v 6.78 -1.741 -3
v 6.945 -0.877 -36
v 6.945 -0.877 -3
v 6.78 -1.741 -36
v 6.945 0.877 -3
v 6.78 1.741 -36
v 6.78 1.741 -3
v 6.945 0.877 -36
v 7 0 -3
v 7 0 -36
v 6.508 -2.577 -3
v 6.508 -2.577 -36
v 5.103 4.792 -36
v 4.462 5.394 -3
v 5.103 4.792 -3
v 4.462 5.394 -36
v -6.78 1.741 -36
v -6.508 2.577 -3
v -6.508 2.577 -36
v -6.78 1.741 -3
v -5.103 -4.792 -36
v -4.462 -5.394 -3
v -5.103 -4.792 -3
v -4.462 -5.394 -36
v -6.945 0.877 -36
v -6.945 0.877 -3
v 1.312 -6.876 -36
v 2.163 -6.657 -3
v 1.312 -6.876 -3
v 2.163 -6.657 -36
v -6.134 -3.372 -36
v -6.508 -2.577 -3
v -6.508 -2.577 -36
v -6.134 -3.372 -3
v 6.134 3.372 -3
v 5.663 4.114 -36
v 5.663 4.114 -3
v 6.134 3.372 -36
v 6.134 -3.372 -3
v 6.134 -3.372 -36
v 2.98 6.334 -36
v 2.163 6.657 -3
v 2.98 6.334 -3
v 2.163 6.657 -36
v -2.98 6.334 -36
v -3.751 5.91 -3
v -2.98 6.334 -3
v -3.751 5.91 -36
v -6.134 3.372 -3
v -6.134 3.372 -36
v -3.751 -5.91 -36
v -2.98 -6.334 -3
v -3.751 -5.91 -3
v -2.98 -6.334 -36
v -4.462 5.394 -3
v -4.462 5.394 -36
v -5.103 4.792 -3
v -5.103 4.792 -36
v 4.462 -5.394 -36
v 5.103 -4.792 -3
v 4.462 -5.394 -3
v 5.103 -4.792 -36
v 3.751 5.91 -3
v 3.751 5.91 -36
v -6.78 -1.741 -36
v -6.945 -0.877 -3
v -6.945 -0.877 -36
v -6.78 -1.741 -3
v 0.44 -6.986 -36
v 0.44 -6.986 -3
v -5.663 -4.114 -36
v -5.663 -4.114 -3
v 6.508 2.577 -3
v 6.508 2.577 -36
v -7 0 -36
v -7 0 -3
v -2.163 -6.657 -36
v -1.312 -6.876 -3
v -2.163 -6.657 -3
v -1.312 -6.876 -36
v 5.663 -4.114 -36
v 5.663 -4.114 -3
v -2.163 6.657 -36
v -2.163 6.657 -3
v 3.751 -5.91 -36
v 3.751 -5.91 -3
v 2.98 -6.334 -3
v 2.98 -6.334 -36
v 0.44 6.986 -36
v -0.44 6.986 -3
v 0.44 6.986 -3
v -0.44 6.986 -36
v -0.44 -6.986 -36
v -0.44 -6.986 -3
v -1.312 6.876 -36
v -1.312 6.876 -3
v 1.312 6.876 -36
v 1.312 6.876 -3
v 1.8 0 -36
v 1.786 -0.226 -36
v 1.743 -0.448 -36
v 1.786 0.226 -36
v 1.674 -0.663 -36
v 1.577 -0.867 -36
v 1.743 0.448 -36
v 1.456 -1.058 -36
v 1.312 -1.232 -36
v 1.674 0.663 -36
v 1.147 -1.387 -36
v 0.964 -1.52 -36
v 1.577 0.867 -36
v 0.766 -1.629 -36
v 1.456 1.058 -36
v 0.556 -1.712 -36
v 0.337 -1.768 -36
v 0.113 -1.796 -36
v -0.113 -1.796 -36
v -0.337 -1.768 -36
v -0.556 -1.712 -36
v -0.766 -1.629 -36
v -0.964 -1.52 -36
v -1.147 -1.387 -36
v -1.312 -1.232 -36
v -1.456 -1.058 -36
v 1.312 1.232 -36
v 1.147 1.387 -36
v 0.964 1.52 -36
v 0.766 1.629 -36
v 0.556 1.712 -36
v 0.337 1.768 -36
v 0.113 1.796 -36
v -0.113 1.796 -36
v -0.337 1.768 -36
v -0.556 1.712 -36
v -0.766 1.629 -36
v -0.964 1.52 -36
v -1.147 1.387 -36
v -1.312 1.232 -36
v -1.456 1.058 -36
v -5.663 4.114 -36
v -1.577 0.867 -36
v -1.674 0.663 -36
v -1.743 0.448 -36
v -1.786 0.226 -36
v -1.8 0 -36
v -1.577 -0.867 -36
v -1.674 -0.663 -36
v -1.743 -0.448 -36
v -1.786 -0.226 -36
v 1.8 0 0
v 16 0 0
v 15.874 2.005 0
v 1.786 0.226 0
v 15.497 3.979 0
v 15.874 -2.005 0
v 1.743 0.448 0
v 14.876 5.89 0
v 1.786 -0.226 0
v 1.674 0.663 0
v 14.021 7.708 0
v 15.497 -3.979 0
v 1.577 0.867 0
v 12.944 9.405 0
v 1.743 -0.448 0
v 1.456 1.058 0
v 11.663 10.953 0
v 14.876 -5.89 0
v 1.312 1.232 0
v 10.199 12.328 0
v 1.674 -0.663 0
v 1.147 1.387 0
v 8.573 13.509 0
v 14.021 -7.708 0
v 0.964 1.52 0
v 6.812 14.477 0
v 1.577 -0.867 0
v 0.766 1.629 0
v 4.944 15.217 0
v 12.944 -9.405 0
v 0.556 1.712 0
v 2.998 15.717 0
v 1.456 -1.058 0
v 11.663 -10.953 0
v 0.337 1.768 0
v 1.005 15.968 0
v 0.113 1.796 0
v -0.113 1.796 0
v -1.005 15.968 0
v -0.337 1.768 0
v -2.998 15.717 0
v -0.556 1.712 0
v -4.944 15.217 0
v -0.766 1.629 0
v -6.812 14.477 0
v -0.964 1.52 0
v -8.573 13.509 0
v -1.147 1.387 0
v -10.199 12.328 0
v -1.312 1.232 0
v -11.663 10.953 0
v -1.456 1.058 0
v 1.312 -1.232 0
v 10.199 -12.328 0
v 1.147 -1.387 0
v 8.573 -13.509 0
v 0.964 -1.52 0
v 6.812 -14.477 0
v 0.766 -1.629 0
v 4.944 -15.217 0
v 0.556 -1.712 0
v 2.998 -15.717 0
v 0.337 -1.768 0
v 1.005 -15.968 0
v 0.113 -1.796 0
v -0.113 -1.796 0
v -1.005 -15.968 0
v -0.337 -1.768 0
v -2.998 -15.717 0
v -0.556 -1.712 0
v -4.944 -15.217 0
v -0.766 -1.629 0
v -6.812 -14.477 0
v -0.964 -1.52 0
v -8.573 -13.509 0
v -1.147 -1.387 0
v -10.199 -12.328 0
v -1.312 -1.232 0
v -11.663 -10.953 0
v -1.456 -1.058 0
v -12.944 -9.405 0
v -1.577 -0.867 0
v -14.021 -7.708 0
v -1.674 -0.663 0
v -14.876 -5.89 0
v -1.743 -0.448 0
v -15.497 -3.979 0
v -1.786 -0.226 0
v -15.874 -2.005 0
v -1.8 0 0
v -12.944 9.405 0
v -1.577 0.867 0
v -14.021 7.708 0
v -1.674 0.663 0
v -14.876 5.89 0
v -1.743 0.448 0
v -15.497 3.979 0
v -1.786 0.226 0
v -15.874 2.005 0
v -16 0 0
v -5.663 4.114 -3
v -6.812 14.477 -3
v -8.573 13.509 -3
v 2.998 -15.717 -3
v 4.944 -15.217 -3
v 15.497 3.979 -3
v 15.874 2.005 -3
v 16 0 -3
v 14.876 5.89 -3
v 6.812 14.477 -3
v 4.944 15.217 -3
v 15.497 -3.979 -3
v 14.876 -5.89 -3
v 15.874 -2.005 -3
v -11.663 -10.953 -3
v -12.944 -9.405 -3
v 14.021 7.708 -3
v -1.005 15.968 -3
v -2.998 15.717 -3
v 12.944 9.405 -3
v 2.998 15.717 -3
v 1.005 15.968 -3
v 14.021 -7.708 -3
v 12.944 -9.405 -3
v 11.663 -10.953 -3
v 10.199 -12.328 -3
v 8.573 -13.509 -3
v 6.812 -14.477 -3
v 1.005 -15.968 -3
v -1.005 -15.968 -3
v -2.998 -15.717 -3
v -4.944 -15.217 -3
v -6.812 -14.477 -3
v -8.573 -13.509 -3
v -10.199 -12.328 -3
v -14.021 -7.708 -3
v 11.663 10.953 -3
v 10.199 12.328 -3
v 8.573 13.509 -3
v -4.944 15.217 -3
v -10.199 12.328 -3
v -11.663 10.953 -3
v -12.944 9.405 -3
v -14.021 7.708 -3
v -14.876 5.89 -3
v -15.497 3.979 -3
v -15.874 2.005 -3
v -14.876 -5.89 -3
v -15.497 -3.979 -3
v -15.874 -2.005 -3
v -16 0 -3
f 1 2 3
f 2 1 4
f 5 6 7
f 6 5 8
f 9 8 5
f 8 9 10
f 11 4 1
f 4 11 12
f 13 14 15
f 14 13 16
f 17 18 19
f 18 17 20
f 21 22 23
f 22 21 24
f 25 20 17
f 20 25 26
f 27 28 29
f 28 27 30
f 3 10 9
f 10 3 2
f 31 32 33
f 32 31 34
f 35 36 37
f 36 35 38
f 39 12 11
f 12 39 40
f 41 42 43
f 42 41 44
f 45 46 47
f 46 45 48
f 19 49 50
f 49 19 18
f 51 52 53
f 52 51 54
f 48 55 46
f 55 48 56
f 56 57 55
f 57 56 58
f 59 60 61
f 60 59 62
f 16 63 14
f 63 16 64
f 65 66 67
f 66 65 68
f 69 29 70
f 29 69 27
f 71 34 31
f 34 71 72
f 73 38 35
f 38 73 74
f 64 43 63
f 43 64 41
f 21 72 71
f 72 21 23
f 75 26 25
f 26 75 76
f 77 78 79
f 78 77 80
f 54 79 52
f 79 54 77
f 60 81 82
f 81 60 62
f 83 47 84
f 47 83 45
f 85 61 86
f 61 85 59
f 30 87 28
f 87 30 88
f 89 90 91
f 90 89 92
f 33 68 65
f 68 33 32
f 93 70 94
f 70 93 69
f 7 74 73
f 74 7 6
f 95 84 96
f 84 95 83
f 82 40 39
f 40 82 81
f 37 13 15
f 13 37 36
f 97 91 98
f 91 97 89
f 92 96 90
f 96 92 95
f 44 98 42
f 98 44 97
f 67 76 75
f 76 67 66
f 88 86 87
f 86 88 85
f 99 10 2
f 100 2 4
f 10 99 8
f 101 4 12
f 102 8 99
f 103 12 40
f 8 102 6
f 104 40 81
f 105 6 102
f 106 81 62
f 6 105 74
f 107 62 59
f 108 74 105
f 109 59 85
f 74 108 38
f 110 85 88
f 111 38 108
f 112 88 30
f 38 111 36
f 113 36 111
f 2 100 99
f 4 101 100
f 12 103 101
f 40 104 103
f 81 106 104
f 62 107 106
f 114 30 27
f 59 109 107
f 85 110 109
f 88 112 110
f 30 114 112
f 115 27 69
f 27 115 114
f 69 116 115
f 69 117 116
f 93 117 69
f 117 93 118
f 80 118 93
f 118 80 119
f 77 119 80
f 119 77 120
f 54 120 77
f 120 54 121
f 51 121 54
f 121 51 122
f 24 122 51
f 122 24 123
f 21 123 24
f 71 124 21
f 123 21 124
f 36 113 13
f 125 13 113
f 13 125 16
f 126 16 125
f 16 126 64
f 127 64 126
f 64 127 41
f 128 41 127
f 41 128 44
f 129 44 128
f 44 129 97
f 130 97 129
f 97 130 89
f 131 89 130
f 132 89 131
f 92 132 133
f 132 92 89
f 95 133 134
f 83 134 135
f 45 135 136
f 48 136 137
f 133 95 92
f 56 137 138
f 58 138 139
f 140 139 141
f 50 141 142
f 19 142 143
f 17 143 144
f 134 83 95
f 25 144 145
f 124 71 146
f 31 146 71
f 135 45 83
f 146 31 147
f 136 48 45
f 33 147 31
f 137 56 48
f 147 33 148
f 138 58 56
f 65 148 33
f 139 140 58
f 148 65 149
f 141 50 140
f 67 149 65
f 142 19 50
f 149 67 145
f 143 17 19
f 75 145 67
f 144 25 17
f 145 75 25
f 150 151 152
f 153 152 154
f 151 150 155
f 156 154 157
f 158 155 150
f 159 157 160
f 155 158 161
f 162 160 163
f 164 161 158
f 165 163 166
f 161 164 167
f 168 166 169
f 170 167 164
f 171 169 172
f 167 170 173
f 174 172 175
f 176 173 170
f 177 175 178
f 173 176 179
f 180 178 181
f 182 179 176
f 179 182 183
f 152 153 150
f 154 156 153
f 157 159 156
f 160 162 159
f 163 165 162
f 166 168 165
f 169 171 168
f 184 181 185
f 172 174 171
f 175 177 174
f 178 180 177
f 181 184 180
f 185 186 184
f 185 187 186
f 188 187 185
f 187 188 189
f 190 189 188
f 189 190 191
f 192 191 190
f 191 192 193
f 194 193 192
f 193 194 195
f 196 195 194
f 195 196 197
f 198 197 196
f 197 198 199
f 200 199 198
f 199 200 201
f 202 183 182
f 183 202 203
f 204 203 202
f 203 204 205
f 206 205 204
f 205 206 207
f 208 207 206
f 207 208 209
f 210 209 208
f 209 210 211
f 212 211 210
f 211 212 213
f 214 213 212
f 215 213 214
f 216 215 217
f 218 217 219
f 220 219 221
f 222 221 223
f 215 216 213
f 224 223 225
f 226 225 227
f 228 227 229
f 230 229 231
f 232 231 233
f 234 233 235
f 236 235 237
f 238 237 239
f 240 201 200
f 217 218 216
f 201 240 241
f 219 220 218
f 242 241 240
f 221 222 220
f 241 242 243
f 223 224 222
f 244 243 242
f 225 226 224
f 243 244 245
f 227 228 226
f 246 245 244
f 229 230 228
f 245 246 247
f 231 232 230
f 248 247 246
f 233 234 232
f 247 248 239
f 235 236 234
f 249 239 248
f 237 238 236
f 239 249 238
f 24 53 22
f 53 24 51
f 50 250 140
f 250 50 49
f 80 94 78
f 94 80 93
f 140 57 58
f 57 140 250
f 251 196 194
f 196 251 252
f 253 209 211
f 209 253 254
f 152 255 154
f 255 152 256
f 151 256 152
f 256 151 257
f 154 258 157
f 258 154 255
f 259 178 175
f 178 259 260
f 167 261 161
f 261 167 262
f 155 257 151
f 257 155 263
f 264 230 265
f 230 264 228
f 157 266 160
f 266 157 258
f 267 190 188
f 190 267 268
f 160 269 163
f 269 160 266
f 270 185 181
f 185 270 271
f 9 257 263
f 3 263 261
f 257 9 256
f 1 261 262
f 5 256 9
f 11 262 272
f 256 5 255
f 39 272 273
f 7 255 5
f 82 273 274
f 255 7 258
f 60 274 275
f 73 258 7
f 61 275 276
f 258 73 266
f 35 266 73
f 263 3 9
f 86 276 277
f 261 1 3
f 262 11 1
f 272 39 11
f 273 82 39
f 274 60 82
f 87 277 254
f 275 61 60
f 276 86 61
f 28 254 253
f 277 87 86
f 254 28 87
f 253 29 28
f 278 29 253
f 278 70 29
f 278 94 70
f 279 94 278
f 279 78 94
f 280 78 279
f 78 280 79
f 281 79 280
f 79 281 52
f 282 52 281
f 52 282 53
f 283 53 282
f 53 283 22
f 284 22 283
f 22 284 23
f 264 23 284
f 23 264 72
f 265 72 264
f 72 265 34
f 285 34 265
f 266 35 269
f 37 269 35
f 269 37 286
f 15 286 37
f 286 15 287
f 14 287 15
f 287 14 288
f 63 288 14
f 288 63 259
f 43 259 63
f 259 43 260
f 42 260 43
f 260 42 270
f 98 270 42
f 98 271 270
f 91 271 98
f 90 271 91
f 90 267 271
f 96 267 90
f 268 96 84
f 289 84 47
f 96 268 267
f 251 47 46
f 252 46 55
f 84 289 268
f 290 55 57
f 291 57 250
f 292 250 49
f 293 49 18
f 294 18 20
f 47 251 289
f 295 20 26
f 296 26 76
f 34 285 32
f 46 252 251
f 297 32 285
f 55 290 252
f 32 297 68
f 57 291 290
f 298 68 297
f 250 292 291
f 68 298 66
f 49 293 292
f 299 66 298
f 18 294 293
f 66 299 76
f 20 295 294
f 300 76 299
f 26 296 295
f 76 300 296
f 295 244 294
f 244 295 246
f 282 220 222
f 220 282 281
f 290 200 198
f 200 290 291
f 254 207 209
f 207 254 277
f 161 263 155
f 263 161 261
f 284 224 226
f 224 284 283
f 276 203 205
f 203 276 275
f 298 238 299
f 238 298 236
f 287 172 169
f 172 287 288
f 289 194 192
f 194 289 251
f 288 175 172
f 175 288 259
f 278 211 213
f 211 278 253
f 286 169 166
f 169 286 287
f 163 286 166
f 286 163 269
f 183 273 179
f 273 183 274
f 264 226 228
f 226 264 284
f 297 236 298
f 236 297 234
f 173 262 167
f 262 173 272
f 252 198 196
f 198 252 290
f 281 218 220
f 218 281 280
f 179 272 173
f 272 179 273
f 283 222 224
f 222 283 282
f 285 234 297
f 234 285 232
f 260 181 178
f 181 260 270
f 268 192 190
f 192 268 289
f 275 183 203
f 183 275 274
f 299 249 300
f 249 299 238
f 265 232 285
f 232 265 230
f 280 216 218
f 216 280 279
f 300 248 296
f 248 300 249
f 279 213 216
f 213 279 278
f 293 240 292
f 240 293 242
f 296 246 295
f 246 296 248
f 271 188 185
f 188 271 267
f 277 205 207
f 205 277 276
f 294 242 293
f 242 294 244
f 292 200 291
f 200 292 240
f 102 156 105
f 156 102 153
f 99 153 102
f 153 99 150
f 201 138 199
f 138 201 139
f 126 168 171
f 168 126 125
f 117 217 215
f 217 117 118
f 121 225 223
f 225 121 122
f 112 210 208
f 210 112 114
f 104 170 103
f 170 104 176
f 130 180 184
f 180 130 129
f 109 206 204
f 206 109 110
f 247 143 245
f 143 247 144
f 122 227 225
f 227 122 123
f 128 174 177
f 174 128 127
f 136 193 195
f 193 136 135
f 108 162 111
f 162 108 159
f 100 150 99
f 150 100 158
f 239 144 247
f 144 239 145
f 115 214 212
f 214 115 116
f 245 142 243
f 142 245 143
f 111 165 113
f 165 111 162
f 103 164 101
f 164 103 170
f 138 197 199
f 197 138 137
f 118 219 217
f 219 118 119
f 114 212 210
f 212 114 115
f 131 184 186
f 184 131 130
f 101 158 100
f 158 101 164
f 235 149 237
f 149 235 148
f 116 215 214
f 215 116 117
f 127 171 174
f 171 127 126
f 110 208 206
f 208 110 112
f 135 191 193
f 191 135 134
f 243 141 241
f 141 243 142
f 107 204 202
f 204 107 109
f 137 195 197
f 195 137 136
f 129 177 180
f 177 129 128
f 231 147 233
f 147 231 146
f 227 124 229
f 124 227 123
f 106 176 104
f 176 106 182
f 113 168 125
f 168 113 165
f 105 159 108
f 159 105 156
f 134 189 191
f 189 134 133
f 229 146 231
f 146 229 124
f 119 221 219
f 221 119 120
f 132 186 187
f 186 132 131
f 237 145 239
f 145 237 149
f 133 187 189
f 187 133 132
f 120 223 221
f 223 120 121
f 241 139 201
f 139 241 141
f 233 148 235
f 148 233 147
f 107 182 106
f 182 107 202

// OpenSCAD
$fn = 50;


difference() {
	union() {
		translate(v = [0, 0, -36.0000000000]) {
			cylinder(h = 36, r = 7.0000000000);
		}
		translate(v = [0, 0, -3.0000000000]) {
			cylinder(h = 3, r = 16.0000000000);
		}
	}
	union() {
		#translate(v = [0, 0, -36]) {
			cylinder(h = 36, r = 1.8000000000);
		}
	}
}
